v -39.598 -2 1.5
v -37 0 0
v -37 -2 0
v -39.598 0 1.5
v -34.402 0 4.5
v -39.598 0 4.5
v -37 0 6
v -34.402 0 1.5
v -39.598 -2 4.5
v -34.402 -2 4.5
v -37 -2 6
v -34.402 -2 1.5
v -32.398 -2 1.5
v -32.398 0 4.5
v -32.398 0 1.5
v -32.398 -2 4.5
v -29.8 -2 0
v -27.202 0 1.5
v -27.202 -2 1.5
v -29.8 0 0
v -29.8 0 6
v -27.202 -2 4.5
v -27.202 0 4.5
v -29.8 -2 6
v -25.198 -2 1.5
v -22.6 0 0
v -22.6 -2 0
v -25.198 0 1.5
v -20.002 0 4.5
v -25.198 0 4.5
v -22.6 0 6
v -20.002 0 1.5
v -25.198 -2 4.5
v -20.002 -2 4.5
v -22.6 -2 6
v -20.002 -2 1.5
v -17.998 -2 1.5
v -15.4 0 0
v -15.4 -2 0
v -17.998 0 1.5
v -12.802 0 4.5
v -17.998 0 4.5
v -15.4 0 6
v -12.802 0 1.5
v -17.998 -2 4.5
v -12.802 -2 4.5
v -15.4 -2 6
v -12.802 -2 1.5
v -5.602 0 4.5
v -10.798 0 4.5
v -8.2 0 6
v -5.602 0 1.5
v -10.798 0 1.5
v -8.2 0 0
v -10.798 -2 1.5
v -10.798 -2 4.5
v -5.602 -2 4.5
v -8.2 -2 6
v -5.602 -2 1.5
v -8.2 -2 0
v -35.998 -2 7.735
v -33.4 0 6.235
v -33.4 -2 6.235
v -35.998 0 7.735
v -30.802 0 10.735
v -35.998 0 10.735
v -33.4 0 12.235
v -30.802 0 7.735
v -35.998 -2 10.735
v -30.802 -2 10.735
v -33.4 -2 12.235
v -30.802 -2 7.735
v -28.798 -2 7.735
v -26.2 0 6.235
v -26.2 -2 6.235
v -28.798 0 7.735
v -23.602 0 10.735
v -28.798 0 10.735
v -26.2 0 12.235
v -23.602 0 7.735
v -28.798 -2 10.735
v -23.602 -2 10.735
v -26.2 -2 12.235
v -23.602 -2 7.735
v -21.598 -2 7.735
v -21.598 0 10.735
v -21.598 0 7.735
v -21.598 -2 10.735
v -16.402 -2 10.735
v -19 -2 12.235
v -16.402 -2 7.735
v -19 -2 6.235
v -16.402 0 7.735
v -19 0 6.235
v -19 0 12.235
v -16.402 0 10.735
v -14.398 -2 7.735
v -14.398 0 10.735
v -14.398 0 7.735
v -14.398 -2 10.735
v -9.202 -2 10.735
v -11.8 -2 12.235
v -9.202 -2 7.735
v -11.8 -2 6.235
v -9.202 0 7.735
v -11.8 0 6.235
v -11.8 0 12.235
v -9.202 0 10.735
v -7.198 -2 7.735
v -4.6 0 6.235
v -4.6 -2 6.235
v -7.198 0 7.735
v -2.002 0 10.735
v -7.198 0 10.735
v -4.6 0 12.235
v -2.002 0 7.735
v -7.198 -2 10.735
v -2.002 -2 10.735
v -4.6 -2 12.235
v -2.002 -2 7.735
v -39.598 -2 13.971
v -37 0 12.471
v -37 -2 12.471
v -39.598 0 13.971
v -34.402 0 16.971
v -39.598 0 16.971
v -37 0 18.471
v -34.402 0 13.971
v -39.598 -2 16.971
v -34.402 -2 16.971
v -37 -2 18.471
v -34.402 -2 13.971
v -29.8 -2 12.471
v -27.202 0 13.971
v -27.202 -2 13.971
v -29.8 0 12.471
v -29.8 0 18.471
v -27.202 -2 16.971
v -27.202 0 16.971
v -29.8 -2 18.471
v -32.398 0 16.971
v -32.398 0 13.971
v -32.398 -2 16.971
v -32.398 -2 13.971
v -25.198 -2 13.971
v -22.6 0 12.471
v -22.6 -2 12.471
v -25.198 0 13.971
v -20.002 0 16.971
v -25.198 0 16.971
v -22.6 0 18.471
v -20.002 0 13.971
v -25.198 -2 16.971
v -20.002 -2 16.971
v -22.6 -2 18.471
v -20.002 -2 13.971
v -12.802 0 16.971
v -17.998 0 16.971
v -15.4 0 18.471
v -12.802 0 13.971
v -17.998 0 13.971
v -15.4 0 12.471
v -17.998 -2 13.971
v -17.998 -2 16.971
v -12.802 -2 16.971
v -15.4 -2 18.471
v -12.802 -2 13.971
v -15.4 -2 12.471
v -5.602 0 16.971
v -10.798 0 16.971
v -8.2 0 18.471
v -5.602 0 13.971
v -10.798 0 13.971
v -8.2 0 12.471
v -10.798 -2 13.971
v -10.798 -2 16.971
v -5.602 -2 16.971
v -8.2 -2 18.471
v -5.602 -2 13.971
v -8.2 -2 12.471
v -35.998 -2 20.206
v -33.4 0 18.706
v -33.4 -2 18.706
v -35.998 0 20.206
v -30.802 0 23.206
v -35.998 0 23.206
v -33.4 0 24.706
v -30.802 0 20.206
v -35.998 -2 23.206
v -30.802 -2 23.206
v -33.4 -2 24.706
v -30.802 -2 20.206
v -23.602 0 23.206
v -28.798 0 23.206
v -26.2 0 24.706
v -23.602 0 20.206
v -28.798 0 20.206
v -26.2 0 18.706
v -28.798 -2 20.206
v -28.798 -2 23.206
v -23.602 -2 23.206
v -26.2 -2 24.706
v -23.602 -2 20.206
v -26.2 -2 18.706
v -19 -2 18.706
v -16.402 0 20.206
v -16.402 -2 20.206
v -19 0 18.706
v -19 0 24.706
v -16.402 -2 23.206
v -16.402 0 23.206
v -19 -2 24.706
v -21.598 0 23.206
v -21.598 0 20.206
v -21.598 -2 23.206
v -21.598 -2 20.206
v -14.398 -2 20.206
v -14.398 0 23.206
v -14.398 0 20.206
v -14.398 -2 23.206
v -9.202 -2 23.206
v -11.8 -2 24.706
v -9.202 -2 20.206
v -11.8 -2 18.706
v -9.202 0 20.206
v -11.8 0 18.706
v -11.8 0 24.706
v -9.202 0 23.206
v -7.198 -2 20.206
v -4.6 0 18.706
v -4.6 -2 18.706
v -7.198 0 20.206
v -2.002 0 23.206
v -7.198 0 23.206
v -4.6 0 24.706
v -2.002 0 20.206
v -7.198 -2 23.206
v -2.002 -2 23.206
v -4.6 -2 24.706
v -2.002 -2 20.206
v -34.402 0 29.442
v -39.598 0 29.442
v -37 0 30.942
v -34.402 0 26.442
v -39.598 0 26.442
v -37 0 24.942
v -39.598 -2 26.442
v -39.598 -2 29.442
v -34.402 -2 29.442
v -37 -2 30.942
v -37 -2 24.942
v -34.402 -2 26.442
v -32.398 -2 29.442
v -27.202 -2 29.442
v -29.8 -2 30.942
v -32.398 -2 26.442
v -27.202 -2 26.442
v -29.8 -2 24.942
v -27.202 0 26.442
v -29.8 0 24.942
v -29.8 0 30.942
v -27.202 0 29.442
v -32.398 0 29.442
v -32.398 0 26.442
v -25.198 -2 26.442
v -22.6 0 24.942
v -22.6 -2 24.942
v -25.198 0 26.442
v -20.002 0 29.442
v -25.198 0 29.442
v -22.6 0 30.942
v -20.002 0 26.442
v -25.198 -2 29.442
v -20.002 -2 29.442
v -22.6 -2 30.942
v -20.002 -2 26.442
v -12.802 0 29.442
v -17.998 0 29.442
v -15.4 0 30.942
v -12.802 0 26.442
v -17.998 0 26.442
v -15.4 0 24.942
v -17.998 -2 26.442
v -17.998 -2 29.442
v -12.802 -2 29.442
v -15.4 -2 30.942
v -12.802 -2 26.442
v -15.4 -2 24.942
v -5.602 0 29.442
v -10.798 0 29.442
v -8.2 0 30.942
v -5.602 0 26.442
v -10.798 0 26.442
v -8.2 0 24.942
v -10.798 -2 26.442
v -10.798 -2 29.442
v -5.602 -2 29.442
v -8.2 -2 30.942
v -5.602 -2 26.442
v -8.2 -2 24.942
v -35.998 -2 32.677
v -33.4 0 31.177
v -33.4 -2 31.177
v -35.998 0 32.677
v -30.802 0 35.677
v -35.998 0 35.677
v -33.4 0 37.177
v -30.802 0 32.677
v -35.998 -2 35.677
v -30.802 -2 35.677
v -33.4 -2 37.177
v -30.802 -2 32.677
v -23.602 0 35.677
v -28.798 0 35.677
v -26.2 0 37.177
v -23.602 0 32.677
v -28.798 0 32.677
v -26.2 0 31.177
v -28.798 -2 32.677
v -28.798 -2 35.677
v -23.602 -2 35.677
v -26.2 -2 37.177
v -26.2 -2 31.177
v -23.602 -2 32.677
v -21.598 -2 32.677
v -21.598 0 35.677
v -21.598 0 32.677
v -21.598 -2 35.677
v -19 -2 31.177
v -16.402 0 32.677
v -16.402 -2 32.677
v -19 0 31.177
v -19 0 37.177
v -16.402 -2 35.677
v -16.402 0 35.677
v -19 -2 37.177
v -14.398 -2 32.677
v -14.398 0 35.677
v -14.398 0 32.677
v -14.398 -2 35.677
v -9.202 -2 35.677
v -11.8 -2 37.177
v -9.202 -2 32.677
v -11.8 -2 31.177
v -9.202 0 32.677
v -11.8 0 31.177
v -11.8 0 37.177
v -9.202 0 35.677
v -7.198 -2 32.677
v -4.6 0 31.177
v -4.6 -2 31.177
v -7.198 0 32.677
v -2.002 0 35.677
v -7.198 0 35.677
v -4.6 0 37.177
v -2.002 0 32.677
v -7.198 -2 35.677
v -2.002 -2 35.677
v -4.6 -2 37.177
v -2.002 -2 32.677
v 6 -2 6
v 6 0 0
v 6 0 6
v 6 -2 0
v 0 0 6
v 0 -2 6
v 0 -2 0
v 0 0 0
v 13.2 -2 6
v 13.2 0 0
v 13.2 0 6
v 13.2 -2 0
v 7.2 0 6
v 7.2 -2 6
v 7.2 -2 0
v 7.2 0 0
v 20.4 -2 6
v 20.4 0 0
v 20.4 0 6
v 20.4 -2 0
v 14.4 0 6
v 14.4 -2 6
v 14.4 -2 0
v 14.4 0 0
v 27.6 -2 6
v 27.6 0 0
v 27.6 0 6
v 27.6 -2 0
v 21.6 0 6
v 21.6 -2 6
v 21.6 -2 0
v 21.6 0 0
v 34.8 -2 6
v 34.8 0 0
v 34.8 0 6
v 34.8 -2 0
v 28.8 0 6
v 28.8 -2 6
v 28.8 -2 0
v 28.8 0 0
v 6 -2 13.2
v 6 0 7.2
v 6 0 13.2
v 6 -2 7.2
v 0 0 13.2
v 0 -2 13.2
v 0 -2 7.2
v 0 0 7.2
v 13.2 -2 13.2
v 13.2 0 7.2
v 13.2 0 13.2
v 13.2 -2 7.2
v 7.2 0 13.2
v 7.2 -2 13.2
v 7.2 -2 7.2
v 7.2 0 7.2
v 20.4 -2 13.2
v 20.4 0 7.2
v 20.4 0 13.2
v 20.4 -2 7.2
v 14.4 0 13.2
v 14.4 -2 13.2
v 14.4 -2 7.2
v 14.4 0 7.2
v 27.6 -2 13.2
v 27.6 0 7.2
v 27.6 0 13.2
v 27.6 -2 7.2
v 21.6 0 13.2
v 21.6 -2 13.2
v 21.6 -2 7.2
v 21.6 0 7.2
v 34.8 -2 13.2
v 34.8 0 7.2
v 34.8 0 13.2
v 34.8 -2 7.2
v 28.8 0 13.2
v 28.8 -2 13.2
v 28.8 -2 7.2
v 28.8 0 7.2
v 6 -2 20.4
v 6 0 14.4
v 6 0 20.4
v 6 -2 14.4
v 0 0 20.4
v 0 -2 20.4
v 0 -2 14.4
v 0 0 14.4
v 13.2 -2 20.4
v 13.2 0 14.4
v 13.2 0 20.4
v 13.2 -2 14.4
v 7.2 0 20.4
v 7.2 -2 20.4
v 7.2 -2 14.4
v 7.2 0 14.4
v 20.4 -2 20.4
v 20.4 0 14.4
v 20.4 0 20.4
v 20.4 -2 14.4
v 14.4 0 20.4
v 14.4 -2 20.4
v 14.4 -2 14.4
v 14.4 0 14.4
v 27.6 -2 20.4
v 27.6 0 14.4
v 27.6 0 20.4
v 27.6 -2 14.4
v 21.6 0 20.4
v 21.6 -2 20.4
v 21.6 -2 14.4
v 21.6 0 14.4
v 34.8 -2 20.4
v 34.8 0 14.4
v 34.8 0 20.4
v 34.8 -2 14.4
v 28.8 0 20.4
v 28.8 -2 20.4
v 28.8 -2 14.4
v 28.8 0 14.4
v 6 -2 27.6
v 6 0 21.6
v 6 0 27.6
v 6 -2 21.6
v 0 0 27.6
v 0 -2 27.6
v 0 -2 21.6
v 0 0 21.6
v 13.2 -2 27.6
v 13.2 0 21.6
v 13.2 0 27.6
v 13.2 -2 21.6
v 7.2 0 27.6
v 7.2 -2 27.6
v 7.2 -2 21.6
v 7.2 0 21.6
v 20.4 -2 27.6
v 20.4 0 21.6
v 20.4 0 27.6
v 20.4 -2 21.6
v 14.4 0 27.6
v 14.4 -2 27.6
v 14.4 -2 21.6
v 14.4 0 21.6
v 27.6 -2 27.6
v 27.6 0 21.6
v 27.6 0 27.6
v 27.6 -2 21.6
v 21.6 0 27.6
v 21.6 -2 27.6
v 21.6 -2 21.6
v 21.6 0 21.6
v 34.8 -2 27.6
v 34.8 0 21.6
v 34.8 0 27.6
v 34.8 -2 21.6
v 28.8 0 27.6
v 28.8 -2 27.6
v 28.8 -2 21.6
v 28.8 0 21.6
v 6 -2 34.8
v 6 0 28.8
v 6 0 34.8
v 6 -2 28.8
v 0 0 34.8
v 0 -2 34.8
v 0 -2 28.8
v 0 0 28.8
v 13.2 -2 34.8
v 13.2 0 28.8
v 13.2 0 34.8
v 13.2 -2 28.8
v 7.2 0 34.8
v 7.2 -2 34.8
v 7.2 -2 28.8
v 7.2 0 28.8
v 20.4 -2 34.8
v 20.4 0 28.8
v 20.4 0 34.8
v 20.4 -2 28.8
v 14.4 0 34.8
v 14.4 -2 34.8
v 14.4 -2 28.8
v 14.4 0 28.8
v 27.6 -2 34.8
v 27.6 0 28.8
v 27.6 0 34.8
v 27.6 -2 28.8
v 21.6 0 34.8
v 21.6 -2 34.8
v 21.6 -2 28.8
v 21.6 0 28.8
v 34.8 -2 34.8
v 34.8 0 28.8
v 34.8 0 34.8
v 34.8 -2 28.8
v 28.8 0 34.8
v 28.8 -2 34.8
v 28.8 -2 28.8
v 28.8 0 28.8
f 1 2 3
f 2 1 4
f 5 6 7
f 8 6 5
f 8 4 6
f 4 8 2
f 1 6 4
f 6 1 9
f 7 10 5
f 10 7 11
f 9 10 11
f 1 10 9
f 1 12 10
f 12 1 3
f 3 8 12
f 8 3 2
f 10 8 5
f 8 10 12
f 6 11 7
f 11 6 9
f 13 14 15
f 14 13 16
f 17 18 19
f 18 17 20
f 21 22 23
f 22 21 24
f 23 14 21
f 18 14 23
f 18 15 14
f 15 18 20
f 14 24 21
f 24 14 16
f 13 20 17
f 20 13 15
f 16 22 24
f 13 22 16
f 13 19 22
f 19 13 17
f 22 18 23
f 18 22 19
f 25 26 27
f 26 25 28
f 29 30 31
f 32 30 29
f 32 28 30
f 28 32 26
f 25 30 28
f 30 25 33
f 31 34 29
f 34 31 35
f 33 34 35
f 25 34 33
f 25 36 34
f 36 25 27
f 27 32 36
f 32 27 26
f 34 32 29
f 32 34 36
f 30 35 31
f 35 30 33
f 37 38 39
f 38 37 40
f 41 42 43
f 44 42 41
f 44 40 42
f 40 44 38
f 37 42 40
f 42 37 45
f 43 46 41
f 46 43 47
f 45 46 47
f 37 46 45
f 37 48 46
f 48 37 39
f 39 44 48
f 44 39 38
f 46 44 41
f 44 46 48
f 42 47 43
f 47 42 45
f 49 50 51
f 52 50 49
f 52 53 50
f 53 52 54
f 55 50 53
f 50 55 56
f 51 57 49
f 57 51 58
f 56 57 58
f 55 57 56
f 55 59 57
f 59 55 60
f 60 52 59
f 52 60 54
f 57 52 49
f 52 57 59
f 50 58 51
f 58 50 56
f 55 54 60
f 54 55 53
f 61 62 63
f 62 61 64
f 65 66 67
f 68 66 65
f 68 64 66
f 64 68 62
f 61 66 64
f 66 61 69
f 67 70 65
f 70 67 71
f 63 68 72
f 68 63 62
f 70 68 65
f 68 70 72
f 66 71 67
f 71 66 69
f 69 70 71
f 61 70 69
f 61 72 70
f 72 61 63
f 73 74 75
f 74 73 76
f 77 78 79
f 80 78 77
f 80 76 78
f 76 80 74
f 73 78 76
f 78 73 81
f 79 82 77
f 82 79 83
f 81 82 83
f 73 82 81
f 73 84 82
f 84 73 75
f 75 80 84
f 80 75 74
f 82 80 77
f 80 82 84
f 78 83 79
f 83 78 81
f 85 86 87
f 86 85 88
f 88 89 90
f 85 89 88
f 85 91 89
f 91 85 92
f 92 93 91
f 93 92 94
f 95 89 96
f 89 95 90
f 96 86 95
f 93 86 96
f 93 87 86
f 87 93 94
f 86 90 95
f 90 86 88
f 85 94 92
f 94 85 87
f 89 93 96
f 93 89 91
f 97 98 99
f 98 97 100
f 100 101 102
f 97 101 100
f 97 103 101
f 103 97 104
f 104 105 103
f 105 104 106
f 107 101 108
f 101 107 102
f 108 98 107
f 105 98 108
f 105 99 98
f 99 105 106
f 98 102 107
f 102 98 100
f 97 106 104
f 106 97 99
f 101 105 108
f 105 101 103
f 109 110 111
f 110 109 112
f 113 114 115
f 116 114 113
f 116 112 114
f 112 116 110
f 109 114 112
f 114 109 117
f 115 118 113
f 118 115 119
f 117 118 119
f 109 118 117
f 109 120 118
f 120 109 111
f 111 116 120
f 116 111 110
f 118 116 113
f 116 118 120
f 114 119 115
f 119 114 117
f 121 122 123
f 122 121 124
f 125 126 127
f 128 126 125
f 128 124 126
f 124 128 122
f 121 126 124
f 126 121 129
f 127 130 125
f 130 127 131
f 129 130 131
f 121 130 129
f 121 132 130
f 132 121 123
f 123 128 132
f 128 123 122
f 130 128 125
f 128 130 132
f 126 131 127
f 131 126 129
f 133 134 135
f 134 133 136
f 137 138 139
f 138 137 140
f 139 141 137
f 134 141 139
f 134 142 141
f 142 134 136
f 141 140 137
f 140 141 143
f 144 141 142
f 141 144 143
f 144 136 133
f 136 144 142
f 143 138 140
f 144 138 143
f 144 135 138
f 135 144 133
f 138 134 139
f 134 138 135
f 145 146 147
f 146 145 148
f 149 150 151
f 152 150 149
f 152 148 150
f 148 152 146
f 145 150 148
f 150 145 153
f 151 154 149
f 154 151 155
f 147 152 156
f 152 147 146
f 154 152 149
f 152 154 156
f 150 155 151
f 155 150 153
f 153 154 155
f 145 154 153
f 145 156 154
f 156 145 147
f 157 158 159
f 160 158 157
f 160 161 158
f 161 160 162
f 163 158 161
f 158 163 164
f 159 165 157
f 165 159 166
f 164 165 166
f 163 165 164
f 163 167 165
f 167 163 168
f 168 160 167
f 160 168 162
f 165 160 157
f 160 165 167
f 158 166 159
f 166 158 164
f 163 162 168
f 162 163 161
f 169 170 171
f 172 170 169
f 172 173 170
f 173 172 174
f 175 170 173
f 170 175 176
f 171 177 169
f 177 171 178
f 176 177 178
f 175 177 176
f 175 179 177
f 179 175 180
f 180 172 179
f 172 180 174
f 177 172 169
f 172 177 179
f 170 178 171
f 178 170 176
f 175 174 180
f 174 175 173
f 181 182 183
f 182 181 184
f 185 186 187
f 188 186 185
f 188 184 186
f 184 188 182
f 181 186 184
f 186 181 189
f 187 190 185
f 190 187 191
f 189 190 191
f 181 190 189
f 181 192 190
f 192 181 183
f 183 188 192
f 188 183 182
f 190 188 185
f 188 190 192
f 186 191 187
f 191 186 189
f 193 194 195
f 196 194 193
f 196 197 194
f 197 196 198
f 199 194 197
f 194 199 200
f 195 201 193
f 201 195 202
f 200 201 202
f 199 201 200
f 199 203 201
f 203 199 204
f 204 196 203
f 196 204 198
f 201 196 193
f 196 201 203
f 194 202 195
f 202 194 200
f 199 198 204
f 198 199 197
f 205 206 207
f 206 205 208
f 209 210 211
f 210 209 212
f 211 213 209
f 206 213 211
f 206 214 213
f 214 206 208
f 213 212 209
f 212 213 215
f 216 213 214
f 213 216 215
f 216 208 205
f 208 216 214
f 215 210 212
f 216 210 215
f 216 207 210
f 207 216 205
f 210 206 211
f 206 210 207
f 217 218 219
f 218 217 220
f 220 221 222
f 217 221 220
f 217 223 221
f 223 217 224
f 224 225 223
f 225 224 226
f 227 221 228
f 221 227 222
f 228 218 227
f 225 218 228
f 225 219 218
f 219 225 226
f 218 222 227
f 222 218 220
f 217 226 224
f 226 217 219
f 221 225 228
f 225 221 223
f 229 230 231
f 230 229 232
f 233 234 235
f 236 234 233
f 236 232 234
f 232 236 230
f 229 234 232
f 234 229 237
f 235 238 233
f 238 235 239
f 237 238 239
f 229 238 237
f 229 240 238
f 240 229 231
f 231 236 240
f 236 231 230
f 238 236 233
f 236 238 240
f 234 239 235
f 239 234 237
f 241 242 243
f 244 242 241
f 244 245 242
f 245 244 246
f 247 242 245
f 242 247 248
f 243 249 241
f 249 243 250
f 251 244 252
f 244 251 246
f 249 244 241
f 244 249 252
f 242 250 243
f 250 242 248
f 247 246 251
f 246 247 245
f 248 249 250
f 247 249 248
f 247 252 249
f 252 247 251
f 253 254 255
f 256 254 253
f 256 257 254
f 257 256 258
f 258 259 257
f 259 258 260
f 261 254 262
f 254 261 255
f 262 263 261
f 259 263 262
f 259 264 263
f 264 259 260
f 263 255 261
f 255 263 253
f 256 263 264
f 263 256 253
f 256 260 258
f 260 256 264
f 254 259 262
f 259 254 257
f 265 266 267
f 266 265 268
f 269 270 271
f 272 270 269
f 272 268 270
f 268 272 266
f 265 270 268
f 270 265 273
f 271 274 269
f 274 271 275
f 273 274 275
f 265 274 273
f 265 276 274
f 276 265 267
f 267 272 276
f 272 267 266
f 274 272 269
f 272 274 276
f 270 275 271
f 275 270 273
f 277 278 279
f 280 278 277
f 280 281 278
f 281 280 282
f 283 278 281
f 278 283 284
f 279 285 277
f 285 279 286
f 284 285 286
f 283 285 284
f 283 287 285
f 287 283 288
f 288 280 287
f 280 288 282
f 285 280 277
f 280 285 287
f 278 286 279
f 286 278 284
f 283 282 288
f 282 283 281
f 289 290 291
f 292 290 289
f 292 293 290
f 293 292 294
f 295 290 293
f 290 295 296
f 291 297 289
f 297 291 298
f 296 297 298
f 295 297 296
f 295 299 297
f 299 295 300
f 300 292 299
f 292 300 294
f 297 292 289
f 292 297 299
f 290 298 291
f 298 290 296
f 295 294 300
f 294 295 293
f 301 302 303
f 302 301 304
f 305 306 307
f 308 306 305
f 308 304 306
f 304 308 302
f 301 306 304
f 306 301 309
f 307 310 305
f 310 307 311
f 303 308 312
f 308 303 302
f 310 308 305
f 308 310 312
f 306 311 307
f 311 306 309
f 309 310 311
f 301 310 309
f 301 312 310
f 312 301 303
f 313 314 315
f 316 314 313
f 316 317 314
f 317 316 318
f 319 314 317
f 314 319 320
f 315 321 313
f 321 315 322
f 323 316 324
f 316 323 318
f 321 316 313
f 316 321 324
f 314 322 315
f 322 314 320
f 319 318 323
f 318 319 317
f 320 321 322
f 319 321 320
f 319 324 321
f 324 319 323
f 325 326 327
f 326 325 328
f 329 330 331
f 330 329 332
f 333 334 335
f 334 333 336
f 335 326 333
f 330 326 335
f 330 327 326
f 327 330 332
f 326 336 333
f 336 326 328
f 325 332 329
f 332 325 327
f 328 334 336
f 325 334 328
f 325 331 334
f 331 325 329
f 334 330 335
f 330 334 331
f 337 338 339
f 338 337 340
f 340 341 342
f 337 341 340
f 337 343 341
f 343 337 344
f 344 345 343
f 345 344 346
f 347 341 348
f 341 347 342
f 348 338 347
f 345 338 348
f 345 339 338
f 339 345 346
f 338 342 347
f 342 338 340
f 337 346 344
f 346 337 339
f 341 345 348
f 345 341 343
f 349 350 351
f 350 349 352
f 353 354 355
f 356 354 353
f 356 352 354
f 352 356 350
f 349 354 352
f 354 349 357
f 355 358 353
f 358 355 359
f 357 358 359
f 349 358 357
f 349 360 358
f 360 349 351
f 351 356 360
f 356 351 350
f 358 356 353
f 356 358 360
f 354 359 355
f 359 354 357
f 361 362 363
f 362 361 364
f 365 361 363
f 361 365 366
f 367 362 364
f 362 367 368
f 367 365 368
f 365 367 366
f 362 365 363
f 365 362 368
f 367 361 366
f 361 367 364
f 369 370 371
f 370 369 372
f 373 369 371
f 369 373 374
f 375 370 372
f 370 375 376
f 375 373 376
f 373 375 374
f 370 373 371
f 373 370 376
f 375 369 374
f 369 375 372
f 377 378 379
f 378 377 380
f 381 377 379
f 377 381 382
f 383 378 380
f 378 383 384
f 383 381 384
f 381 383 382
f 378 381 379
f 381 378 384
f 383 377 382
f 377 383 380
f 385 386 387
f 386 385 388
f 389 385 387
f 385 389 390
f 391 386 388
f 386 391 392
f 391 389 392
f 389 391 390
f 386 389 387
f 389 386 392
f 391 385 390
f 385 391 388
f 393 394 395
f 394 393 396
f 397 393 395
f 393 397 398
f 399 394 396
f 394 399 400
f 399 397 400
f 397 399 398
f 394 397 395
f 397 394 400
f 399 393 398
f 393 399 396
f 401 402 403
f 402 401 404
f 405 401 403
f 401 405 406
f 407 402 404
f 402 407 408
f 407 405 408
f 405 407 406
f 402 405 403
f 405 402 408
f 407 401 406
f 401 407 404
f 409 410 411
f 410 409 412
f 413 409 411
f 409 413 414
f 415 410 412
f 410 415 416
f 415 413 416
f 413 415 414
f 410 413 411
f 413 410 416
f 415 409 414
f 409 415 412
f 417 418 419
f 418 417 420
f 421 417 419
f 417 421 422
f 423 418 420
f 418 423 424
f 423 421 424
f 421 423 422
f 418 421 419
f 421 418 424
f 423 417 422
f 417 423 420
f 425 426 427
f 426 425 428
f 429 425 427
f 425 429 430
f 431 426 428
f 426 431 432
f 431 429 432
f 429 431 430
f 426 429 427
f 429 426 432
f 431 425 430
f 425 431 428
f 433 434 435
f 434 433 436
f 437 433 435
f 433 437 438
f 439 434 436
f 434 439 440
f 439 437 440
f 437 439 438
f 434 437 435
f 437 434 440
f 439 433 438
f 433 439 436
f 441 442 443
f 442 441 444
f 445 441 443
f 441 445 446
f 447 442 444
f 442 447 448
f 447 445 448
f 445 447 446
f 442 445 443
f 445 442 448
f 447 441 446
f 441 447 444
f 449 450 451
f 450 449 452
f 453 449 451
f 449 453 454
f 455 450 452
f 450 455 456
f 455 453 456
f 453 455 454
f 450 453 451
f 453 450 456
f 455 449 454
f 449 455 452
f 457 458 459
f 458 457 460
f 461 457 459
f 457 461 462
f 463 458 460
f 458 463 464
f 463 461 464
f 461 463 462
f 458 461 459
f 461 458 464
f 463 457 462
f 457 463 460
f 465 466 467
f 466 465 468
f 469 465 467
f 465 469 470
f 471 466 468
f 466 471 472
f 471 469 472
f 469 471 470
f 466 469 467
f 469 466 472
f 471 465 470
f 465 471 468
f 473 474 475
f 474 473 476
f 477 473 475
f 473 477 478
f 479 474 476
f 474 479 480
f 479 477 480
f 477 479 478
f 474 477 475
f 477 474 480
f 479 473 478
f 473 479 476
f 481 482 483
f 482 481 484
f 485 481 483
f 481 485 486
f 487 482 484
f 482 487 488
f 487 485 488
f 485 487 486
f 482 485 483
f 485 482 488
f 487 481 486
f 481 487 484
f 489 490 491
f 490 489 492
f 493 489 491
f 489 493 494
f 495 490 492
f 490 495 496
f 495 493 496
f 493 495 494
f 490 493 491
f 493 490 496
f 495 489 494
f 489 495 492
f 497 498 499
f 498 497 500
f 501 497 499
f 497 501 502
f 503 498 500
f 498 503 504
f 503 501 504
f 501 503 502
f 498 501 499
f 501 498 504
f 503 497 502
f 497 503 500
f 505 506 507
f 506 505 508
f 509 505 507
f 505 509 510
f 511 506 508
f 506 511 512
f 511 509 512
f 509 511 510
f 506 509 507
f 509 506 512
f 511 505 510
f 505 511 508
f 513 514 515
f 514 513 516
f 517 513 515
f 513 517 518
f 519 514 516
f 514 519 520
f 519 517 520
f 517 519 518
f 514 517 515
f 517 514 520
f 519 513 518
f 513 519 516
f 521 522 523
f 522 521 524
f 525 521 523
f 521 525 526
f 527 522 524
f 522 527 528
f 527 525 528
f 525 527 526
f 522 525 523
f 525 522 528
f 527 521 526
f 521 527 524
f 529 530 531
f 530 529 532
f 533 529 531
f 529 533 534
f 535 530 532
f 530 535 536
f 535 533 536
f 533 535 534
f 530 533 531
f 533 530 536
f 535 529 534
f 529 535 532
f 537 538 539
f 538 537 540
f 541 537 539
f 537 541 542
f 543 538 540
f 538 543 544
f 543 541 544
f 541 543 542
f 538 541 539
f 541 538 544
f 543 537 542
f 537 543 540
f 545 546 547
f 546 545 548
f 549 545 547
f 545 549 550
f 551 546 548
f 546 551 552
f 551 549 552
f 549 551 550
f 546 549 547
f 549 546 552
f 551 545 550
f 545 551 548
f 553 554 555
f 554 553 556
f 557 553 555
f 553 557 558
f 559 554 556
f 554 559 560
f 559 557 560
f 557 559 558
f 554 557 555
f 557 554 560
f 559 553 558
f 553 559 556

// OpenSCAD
/*
**
** Design Patterns
**
*/
// Programmatic design patterns
//
// Author: Steven Nemetz
//
// Current version GitHub: https://github.com/snemetz/OpenSCAD-Modules/
// Thingiverse Customizable: http://www.thingiverse.com/thing:
/*
  REVISION HISTORY
  v0.1 Hex/Honeycomb & Grid patterns
*/
// TODO:
//    spiral
//    Hex add option for cropped at box edge (cut hexes)
//    round holes w/ box option ??

Width     = 40;
Height    = 40;
Diameter  = 6;
Spacing   = 1.2;
Thickness = 2;

module gridHoles(width, height, cubeSize, spacing, thick) {
  offset = cubeSize + spacing;
  cols = width / offset;
  rows = height / offset;
  translate([0, -thick, 0])
    for (i=[0:rows-1]) {
      for (j=[0:cols-1]) {
        translate([j*offset, 0, i*offset])
          cube([cubeSize, thick, cubeSize]);
      }
    }
}
module hexHoles(width, height, hexDia, spacing, thick) {
  // If boxed: add 1 to columns, then crop (x) left & right
  hOffset = hexDia + spacing;
  vOffset = sqrt(pow(hOffset,2)-pow(hOffset/2,2));
  cols = width / hOffset;
  rows = height / vOffset;
  translate([hexDia/2, 0, hexDia/2])
    for (i=[0:rows-1]) {
      for (j=[0:cols-1]) {
        translate([j*hOffset+i%2*(hOffset/2), 0, i*vOffset])
          rotate([90,90,0]) cylinder(h=thick, r=hexDia/2, $fn=6);
      }
    }
}

translate([-Width, 0, 0]) hexHoles(Width, Height, Diameter, Spacing, Thickness);
gridHoles(Width, Height, Diameter, Spacing, Thickness);
